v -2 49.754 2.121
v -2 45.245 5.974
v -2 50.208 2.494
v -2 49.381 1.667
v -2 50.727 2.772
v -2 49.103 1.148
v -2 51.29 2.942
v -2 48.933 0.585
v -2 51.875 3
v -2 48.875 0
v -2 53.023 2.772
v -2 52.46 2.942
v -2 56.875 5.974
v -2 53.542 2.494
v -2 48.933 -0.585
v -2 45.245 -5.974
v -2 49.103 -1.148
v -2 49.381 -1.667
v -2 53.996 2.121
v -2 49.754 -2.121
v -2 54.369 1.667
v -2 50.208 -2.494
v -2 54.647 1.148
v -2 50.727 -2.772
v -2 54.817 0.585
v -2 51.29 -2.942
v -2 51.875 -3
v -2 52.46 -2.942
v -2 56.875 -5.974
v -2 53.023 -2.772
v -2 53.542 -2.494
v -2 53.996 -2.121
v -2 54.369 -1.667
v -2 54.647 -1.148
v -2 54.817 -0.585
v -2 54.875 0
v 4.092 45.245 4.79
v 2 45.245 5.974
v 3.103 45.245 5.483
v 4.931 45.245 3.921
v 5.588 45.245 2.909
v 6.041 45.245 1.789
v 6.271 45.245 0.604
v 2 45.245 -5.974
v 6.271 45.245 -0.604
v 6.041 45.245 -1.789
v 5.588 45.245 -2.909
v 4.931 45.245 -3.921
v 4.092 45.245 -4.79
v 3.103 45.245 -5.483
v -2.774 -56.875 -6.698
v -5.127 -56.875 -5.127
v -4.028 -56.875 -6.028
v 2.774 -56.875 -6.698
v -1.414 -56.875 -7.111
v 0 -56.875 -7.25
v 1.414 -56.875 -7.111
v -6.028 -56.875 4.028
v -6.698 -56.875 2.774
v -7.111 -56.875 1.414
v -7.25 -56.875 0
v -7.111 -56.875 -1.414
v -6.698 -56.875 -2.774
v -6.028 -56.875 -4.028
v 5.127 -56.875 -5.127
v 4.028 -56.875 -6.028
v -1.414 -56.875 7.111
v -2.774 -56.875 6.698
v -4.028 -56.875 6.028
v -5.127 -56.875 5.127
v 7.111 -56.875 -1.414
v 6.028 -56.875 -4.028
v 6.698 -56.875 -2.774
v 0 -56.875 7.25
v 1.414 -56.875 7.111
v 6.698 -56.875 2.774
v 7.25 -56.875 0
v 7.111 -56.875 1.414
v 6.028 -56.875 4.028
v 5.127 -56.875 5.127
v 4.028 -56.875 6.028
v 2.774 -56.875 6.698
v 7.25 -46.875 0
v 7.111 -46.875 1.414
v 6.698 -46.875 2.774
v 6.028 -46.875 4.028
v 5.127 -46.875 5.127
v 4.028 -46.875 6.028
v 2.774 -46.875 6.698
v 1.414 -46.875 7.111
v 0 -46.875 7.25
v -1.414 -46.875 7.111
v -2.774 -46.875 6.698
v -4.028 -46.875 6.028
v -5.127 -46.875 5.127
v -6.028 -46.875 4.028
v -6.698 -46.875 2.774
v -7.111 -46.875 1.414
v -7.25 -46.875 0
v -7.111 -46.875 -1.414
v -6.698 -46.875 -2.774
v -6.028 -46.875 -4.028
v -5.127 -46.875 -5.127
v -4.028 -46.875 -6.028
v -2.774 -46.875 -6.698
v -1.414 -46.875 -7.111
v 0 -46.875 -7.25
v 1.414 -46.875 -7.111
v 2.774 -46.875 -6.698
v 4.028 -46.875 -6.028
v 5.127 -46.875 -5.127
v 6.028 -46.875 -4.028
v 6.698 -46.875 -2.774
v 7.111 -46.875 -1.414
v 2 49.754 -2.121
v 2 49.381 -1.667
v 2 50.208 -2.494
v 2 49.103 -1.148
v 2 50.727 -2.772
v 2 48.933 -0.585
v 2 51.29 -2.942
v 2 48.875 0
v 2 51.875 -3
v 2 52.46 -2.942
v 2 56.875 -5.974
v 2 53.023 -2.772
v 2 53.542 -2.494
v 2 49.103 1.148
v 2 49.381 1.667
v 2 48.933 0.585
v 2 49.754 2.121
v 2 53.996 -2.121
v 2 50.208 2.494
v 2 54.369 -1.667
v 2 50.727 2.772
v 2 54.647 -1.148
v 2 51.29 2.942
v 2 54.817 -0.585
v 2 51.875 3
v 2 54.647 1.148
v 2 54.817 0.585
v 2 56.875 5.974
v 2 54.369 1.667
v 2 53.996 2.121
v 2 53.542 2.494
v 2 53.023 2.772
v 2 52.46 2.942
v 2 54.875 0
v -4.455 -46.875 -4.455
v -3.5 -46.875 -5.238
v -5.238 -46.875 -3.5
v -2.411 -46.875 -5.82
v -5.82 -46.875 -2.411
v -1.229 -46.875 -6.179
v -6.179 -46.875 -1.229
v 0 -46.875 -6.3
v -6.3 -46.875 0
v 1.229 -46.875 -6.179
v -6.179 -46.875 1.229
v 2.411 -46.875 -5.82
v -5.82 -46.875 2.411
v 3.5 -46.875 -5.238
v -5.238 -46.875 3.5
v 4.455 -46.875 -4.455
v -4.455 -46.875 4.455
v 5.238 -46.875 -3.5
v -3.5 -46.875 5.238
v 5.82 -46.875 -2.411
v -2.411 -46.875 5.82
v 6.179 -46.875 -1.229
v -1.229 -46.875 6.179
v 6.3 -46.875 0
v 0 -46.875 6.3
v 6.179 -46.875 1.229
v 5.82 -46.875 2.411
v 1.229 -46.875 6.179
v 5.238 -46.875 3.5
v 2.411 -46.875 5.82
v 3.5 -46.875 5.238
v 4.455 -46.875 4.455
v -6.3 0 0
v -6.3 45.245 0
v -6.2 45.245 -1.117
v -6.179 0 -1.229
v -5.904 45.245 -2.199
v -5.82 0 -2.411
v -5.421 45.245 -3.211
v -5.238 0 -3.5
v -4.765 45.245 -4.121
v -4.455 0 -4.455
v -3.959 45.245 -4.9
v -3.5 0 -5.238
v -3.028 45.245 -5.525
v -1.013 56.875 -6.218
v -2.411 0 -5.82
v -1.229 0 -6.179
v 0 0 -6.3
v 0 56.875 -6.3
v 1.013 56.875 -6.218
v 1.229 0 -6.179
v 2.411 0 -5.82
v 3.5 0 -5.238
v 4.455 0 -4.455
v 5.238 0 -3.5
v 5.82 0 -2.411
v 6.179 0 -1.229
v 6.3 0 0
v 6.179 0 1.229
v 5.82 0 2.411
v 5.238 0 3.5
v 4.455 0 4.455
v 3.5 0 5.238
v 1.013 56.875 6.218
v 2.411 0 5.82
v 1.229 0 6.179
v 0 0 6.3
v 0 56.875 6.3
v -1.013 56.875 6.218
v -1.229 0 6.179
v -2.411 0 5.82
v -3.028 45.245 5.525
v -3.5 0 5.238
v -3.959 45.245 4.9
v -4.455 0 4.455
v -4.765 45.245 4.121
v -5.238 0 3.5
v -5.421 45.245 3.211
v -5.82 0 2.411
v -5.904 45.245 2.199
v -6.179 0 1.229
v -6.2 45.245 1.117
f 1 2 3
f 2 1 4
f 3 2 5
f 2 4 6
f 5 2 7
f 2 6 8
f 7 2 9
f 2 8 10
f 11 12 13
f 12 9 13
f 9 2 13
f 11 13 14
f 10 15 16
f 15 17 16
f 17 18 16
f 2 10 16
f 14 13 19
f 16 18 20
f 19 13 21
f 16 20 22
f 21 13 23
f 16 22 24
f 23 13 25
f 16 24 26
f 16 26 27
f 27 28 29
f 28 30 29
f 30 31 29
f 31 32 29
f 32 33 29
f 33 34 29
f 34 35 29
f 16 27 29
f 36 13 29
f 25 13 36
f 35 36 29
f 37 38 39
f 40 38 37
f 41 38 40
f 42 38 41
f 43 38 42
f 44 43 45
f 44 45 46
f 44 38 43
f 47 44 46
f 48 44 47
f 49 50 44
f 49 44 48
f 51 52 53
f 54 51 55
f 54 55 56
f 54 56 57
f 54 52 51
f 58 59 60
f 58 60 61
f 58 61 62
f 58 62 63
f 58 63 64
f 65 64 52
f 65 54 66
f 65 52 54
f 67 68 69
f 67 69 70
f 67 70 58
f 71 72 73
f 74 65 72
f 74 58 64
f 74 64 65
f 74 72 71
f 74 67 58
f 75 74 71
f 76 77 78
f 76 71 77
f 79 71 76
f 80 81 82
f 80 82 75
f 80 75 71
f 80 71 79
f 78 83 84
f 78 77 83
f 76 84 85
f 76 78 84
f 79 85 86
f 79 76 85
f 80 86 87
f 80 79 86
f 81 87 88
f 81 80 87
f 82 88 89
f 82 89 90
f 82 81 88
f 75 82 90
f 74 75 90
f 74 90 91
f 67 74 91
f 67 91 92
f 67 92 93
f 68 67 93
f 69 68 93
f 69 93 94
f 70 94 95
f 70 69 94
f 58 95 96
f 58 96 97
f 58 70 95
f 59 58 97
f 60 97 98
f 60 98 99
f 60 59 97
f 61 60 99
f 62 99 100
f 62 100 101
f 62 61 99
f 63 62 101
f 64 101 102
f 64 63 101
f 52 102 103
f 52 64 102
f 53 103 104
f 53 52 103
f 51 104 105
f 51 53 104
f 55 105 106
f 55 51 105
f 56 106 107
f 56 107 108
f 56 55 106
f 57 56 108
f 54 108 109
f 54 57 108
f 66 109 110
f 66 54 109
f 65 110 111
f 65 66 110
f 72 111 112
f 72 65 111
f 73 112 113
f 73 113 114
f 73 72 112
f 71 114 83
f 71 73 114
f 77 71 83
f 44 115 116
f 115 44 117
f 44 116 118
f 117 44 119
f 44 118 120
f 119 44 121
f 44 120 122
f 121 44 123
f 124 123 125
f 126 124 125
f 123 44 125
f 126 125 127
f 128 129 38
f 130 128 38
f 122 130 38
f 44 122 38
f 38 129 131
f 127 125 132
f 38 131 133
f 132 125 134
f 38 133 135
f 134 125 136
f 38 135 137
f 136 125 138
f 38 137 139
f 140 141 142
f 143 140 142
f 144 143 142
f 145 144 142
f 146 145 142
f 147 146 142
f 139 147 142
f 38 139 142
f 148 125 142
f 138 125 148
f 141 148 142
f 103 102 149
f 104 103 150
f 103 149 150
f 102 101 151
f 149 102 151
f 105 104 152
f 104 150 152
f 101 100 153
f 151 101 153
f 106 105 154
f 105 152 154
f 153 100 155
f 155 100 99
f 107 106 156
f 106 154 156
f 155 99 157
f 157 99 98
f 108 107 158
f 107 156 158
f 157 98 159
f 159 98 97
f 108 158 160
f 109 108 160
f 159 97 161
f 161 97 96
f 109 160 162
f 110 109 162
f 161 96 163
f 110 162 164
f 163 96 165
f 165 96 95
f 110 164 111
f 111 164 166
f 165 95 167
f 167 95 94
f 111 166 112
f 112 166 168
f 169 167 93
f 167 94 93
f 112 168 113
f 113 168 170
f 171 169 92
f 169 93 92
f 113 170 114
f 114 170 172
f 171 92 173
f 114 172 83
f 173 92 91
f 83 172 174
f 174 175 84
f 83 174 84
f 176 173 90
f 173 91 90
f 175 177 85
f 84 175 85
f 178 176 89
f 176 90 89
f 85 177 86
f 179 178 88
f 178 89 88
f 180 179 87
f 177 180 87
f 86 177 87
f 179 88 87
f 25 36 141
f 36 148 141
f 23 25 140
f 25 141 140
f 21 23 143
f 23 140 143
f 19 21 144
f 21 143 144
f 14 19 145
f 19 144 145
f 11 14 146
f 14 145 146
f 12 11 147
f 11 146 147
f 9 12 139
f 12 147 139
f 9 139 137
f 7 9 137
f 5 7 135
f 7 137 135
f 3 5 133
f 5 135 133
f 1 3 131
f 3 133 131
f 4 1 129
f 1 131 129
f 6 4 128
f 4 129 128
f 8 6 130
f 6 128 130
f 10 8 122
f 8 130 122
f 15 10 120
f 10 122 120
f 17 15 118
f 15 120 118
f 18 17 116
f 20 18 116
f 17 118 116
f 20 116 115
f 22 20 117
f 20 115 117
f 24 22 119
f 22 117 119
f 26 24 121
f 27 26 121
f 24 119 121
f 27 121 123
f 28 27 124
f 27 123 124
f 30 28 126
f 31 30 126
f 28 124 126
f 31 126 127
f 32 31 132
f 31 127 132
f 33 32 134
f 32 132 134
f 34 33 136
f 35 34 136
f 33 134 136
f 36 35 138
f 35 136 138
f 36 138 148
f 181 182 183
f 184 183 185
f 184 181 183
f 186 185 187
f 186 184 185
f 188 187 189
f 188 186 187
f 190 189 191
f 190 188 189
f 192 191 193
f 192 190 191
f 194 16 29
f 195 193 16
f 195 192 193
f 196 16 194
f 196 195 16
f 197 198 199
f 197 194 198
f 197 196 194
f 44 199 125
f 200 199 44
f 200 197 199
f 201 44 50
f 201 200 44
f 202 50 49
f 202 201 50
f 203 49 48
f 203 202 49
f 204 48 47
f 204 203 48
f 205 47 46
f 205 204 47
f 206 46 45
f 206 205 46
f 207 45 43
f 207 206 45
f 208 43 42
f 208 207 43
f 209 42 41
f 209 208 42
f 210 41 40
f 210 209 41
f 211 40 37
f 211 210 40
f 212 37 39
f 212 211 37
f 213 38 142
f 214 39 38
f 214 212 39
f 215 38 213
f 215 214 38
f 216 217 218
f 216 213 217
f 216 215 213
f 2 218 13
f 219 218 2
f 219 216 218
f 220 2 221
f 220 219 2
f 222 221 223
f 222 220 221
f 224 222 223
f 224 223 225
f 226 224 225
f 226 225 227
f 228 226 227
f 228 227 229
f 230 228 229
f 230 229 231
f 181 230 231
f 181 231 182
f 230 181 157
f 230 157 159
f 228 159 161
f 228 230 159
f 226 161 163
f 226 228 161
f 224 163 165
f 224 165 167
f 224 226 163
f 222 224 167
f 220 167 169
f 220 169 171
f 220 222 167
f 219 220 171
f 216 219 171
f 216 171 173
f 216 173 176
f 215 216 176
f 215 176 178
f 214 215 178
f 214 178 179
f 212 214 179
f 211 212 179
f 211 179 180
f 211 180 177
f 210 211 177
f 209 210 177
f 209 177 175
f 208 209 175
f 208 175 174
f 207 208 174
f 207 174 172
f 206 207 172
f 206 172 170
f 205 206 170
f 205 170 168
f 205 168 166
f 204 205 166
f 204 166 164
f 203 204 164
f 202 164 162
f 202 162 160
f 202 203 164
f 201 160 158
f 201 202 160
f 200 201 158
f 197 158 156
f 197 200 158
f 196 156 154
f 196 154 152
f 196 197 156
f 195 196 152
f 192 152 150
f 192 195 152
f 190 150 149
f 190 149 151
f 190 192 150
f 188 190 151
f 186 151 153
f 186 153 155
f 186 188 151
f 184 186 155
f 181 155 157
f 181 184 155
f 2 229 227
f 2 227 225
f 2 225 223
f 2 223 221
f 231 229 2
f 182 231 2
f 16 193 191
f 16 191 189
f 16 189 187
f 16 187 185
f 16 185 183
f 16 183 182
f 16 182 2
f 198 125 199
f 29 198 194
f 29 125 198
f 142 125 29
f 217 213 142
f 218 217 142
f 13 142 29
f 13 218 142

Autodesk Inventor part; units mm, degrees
ref_plane "YZ Plane" through (0, 0, 0) normal (1, 0, 0) x (0, 1, 0)
ref_plane "XZ Plane" through (0, 0, 0) normal (0, 1, 0) x (-1, 0, 0)
ref_plane "XY Plane" through (0, 0, 0) normal (0, 0, 1) x (1, 0, 0)
sketch "Sketch1" plane through (0, 0, 0) normal (0, 1, 0) x (-1, 0, 0)
  circle A0 centre (0, 0) radius 6.3
  dimension "d0" = 12.6
extrude "Extrusion1" add sketch "Sketch1" along normal mid plane 113.75
sketch "Sketch2" plane through (0, 0, 0) normal (1, 0, 0) x (0, 1, 0)
  line L0 (56.875, -6.3) -> (56.875, 6.3) projected
  line L1 (-56.875, -6.3) -> (56.875, -6.3) projected
  line L2 (56.875, 6.3) -> (45.245, 6.3)
  line L3 (45.245, 6.3) -> (45.245, -6.3)
  line L4 (45.245, -6.3) -> (56.875, -6.3)
  line L5 (56.875, -6.3) -> (56.875, 6.3)
  line L6 (56.875, 0) -> (51.875, 0)
  circle A0 centre (51.875, 0) radius 3
  point P0 (0, 0)
  dimension "d3" = 11.63
  dimension "d7" = 5
  dimension "d8" = 6
sketch "Sketch3" plane through (0, 56.875, 0) normal (0, 1, 0) x (1, 0, 0)
  circle A0 centre (0, 0) radius 6.3 projected
  line L0 (2, -5.9741) -> (-2, -5.9741)
  line L1 (-2, -5.9741) -> (-2, 5.9741)
  line L2 (-2, 5.9741) -> (2, 5.9741)
  line L3 (2, 5.9741) -> (2, -5.9741)
  line L4 (2, -5.9741) -> (-2, 5.9741) construction
  line L5 (-2, -5.9741) -> (2, 5.9741) construction
  dimension "d4" = 4
extrude "Extrusion2" cut sketch "Sketch3" against normal blind 11.63 contours A0 L3 | L1 A0
extrude "Extrusion3" cut sketch "Sketch2" against normal mid plane 11.63 contours A0
sketch "Sketch4" plane through (0, -56.875, 0) normal (0, -1, 0) x (1, 0, 0)
  circle A0 centre (0, 0) radius 7.25
  dimension "d11" = 14.5
extrude "Extrusion4" add sketch "Sketch4" against normal blind 10
properties part number "vastago"
